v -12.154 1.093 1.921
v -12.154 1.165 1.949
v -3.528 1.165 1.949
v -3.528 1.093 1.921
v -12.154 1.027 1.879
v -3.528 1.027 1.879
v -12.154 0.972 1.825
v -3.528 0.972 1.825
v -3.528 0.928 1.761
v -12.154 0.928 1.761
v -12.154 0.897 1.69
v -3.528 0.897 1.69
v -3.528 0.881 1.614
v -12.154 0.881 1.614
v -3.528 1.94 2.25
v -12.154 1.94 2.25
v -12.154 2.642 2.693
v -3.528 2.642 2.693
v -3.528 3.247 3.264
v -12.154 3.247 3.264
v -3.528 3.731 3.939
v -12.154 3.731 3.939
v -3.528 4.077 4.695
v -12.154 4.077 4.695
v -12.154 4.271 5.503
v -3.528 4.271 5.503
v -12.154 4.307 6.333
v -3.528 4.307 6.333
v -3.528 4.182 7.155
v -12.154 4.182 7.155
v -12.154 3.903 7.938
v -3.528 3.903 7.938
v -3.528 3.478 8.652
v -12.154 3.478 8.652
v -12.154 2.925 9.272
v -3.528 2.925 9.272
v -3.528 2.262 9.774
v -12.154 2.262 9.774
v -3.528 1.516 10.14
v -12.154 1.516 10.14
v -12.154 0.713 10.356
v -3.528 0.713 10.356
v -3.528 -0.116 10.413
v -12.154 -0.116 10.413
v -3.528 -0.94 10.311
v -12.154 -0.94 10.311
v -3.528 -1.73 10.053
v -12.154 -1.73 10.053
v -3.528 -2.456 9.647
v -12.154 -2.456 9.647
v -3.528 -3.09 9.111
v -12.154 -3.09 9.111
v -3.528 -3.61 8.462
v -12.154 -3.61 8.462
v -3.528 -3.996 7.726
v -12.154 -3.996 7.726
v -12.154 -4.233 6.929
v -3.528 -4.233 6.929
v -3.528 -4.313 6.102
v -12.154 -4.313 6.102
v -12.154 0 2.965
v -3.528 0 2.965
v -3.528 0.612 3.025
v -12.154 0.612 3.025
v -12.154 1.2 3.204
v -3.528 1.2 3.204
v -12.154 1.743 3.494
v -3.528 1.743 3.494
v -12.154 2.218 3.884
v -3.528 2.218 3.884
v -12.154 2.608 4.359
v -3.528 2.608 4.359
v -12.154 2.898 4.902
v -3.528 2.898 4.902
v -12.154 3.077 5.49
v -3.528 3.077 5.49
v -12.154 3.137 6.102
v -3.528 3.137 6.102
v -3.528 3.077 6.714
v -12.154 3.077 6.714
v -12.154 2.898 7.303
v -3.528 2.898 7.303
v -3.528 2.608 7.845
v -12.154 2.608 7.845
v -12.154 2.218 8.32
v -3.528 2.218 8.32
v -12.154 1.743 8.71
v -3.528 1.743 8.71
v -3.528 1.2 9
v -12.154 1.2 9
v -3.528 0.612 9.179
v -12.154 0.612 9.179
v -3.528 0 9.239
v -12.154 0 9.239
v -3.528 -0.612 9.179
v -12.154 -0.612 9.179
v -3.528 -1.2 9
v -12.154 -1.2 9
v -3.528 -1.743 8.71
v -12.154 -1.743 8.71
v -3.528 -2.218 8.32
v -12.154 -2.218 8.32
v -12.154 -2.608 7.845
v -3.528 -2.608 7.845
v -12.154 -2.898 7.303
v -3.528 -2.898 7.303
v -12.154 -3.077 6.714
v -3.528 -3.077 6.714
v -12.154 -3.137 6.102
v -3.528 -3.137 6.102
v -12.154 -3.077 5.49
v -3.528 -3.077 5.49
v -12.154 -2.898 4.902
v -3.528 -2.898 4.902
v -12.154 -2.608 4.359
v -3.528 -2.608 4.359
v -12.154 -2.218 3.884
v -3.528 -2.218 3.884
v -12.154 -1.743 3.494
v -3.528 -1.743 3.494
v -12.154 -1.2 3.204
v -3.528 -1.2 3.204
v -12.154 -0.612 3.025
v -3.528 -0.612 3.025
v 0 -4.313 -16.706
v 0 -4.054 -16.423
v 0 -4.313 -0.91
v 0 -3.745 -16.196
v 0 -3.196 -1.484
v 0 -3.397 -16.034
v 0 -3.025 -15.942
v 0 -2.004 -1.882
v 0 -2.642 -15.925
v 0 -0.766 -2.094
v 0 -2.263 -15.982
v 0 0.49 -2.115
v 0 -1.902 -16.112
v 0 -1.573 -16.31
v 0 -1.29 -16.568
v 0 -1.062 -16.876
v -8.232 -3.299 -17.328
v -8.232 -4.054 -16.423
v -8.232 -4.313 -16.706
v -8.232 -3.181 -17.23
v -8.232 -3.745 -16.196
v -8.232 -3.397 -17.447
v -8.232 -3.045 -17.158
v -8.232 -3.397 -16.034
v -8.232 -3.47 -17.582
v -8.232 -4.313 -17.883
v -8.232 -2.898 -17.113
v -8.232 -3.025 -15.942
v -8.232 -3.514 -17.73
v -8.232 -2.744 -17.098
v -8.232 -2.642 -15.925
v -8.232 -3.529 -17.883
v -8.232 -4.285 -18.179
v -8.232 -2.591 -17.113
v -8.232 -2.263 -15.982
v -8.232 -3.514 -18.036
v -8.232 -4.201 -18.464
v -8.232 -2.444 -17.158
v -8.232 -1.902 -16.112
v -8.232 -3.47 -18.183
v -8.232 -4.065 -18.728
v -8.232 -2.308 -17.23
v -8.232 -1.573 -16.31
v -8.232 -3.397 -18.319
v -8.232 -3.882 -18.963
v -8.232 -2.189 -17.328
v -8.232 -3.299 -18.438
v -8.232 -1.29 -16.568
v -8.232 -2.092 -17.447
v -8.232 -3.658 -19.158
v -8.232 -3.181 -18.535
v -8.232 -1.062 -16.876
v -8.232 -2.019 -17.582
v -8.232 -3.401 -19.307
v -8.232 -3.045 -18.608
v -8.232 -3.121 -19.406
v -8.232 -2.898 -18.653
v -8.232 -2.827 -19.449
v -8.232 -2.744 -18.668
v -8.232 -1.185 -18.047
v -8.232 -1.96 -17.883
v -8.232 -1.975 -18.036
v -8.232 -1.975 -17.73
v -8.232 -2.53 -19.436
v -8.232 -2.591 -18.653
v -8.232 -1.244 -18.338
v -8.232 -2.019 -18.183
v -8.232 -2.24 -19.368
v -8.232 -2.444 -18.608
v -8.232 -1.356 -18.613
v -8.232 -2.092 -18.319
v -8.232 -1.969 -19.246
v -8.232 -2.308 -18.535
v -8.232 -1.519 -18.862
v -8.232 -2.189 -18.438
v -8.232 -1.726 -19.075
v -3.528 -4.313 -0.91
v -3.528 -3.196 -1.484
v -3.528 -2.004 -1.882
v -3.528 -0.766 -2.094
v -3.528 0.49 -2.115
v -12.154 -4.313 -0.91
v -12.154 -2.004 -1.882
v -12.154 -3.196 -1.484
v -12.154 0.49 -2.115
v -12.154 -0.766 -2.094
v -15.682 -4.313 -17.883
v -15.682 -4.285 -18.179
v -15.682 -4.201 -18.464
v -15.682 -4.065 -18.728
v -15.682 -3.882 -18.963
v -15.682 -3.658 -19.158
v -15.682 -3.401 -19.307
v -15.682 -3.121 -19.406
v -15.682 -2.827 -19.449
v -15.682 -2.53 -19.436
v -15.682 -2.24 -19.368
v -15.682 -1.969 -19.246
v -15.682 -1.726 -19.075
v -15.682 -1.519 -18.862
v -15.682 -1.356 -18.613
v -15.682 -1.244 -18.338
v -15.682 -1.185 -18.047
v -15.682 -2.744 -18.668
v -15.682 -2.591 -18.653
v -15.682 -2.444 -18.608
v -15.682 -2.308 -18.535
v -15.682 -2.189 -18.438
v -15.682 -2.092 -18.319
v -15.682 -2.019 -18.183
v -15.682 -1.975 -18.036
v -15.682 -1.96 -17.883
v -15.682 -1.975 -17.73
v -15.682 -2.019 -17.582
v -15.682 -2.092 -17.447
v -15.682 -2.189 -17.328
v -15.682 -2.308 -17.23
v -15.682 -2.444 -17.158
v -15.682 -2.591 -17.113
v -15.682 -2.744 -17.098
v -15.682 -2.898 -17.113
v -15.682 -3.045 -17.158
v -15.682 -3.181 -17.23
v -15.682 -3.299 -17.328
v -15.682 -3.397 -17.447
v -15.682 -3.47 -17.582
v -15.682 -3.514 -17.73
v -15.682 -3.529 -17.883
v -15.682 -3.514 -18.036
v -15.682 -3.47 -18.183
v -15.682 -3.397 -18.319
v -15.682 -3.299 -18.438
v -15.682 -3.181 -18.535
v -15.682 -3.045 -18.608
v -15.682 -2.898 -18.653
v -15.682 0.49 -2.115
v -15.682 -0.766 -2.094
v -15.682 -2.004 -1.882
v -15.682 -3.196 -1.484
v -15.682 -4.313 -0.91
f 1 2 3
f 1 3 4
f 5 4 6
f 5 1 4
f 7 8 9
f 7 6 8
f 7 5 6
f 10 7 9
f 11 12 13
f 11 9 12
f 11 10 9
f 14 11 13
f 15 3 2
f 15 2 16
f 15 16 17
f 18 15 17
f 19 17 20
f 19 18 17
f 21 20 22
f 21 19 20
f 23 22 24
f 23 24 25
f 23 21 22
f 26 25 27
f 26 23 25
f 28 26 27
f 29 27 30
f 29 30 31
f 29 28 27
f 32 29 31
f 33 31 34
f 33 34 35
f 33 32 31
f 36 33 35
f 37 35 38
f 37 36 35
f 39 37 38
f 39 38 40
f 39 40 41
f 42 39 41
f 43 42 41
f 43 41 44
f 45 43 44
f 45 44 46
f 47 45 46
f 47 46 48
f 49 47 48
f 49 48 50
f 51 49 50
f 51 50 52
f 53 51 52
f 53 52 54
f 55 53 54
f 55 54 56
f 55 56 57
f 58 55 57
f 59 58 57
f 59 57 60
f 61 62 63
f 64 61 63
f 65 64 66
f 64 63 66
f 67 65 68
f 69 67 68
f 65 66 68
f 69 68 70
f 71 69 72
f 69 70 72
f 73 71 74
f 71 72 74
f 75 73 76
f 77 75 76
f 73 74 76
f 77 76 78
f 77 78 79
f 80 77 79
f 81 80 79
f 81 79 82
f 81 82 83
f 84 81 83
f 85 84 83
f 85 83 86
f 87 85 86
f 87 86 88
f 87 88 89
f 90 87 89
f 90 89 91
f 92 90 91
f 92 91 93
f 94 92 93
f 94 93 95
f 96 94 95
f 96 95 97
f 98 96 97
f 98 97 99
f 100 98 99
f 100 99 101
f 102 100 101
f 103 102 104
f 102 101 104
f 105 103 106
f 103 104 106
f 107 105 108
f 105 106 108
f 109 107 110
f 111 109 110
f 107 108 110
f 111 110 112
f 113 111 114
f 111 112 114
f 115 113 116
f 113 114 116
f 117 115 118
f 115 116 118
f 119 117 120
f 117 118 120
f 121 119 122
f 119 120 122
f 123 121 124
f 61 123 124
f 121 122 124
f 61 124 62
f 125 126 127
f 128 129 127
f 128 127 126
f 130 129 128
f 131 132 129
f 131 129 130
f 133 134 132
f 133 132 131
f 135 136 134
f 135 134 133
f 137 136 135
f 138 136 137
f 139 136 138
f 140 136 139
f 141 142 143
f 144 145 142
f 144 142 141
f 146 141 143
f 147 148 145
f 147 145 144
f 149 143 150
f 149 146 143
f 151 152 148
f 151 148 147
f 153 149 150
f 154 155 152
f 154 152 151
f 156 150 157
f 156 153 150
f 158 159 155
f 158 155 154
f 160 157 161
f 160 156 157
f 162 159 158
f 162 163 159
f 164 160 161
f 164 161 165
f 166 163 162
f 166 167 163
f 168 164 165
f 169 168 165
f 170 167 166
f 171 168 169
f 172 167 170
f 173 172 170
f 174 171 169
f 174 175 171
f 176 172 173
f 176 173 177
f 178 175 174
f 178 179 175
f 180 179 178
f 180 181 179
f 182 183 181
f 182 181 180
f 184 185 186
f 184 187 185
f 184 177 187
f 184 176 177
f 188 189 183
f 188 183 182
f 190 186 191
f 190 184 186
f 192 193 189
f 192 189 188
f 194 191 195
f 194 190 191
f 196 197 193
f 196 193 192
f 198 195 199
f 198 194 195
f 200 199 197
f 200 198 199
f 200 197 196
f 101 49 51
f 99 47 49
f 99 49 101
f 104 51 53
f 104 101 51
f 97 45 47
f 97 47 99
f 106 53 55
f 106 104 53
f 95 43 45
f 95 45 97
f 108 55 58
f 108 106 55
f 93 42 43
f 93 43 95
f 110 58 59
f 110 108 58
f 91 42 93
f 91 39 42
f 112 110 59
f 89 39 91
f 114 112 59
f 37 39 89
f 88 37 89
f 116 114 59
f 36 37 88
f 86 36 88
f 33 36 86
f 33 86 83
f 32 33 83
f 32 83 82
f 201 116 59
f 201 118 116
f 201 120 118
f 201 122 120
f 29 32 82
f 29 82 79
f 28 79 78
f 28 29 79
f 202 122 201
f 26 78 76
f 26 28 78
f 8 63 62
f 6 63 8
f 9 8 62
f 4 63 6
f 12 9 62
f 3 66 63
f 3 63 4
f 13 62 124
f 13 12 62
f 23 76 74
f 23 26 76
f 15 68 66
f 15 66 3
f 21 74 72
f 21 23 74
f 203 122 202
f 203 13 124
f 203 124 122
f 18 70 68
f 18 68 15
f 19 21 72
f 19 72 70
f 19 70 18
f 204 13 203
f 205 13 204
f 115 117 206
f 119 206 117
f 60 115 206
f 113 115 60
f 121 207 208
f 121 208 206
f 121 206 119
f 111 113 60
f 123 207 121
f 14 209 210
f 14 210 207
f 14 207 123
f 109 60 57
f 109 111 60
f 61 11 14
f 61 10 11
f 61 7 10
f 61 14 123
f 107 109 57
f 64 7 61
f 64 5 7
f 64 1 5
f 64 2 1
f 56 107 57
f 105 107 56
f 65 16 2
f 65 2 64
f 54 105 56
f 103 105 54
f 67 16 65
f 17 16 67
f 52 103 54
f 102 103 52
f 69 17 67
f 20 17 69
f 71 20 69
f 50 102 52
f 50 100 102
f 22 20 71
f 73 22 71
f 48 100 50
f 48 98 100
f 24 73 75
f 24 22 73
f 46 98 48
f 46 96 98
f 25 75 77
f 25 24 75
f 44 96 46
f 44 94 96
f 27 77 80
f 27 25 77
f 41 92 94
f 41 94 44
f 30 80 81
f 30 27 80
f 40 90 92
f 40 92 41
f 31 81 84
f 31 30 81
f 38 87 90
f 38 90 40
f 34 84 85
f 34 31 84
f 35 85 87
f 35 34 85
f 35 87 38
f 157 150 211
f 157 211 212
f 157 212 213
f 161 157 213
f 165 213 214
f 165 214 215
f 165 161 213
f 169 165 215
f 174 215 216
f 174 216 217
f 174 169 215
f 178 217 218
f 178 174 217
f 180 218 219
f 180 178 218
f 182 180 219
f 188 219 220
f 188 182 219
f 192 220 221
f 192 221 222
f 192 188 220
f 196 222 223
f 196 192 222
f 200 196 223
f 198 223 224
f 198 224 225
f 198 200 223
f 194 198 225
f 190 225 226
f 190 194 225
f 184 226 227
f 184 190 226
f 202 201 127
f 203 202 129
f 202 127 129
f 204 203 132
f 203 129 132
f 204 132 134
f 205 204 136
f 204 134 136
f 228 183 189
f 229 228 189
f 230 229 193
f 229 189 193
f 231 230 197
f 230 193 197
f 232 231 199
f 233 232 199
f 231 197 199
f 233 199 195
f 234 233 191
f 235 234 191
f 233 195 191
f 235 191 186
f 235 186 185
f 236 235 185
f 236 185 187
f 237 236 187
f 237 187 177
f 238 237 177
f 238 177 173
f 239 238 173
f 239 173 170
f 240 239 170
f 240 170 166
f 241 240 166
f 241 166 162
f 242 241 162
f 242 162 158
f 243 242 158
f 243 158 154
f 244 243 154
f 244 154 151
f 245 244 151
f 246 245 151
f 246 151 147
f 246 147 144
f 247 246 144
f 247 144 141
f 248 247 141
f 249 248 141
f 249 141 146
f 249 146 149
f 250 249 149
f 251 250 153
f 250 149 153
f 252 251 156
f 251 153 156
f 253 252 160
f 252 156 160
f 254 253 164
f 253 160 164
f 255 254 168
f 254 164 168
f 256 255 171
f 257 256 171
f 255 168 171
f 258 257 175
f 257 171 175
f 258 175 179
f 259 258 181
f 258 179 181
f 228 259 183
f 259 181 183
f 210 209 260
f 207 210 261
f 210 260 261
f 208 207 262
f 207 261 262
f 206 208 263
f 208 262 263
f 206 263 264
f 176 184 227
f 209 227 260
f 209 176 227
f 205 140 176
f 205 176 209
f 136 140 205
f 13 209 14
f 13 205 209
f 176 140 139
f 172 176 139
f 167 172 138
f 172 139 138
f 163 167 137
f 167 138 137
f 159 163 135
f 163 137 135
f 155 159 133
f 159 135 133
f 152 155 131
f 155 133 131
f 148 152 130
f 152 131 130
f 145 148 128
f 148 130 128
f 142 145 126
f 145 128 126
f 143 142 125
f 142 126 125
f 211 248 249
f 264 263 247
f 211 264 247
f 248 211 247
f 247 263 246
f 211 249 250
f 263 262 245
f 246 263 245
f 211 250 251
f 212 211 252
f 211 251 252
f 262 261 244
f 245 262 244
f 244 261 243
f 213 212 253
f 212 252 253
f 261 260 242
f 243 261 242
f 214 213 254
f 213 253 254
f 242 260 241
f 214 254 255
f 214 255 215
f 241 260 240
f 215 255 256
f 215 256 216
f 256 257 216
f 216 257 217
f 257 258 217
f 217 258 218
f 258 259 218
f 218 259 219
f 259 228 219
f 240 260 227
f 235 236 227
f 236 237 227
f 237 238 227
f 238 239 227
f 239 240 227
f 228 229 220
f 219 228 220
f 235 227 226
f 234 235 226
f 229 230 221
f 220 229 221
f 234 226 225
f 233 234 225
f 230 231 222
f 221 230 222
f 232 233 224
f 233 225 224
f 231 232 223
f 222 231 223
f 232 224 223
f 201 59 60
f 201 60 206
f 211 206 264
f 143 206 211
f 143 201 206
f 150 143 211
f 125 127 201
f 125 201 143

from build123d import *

# Parameters (mm, degrees)
SKETCH1_R           = 3.1369
SKETCH1_R_2         = 0.78486
BOSS_EXTRUDE1_DEPTH = 15.68196
FILLET1_R           = 0.39116
SKETCH2_R           = 8.23214
CUT_EXTRUDE1_DEPTH  = 3.52806
SKETCH3_R           = 8.23214
CUT_EXTRUDE2_DEPTH  = 3.52806
SKETCH4_R           = 1.96088
CUT_EXTRUDE3_DEPTH  = 8.23214


with BuildPart() as part:
    # Sketch1 → Boss-Extrude1 (new body)
    with BuildSketch(Plane(origin=(0, 0, 0), x_dir=(0, 0, -1), z_dir=(1, 0, 0))):
        with BuildLine():
            Line((-6.102081164, -4.312920003), (17.882851381, -4.312920003))
            ThreePointArc((17.882851381, -4.312920003), (19.449151228, -2.826510031), (18.046700375, -1.184608261))
            Line((18.046700375, -1.184608261), (-1.886270539, 0.910065763))
            ThreePointArc((-1.886270539, 0.910065763), (-9.458144317, 2.708896275), (-6.102081164, -4.312920003))
        make_face()
        with Locations((-6.102081164, -3e-09)):
            Circle(SKETCH1_R, mode=Mode.SUBTRACT)
        with Locations((17.882851381, -2.74447324)):
            Circle(SKETCH1_R_2, mode=Mode.SUBTRACT)
    extrude(amount=-BOSS_EXTRUDE1_DEPTH)

    # Fillet1
    fillet1_edges = [part.edges().sort_by_distance(p)[0] for p in [
        (-7.84098, 0.910065763, 1.886270539),
    ]]
    fillet(fillet1_edges, radius=FILLET1_R)

    # Sketch2 → Cut-Extrude1 (cut)
    with BuildSketch(Plane(origin=(0, 0, 0), x_dir=(0, 0, -1), z_dir=(1, 0, 0))):
        with Locations((-6.102081164, -3e-09)):
            Circle(SKETCH2_R)
    extrude(amount=-CUT_EXTRUDE1_DEPTH, mode=Mode.SUBTRACT)

    # Sketch3 → Cut-Extrude2 (cut)
    with BuildSketch(Plane.ZY.offset(15.68196)):
        with Locations((6.102081164, -3e-09)):
            Circle(SKETCH3_R)
    extrude(amount=-CUT_EXTRUDE2_DEPTH, mode=Mode.SUBTRACT)

    # Sketch4 → Cut-Extrude3 (cut)
    with BuildSketch(Plane(origin=(0, 0, 0), x_dir=(0, 0, -1), z_dir=(1, 0, 0))):
        with Locations((17.882851381, -2.74447324)):
            Circle(SKETCH4_R)
    extrude(amount=-CUT_EXTRUDE3_DEPTH, mode=Mode.SUBTRACT)


solid = part.part
